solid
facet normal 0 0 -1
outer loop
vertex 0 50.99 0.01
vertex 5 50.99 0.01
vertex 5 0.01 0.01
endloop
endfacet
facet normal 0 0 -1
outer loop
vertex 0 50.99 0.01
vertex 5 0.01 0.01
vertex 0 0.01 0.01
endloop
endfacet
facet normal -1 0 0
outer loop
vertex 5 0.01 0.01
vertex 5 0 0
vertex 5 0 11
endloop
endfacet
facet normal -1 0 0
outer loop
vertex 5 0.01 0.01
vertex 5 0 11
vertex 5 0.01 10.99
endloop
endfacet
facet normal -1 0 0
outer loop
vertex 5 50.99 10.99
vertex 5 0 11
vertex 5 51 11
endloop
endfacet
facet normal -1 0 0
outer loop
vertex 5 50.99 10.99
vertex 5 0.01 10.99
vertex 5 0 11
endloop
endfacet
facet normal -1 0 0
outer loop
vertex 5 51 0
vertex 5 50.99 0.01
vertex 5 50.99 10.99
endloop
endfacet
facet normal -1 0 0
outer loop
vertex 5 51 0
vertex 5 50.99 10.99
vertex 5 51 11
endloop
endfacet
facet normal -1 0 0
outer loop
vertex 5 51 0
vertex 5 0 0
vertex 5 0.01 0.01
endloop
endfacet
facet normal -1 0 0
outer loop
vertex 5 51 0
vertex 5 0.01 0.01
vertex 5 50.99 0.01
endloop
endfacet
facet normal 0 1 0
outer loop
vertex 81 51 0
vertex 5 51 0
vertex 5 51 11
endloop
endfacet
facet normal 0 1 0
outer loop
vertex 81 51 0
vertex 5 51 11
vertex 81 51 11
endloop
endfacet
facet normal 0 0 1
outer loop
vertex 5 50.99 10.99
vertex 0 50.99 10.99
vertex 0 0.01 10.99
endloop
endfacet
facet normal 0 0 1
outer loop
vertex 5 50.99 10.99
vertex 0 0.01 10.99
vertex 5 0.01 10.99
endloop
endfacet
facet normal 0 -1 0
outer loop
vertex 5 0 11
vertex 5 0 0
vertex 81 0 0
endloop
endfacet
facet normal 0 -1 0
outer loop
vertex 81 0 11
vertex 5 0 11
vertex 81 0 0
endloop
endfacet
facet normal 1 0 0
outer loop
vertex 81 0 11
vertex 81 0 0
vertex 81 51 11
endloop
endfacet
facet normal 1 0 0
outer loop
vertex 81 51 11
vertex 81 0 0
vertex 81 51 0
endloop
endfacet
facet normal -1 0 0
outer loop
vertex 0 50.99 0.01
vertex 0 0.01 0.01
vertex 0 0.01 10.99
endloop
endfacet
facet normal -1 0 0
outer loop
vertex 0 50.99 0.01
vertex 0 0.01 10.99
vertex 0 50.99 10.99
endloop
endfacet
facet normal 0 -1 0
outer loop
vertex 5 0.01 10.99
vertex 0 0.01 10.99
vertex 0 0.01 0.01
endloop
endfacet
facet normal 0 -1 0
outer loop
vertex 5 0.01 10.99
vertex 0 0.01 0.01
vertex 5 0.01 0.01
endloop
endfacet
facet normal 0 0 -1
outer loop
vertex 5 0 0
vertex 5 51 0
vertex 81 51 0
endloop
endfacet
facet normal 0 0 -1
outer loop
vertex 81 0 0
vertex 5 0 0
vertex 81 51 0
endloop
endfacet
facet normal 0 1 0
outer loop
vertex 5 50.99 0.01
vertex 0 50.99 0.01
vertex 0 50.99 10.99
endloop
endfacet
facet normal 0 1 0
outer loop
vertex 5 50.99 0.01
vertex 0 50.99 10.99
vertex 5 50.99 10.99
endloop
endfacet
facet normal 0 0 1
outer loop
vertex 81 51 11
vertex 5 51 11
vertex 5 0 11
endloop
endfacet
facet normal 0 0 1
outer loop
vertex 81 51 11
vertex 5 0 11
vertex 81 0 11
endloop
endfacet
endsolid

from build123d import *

# Parameters (mm, degrees)
SKETCH1_W           = 81
SKETCH1_H           = 51
BOSS_EXTRUDE1_DEPTH = 11
SKETCH2_W           = 5
SKETCH2_H           = 51
CUT_EXTRUDE1_DEPTH  = 0.01
SKETCH3_W           = 5
SKETCH3_H           = 10.99
CUT_EXTRUDE2_DEPTH  = 0.01
SKETCH4_W           = 5
SKETCH4_H           = 51
CUT_EXTRUDE3_DEPTH  = 0.01
SKETCH5_W           = 5
SKETCH5_H           = 11
CUT_EXTRUDE4_DEPTH  = 0.01


with BuildPart() as part:
    # Sketch1 → Boss-Extrude1 (new body)
    with BuildSketch(Plane.XY):
        with Locations((40.5, 25.5)):
            Rectangle(SKETCH1_W, SKETCH1_H)
    extrude(amount=BOSS_EXTRUDE1_DEPTH)

    # Sketch2 → Cut-Extrude1 (cut)
    with BuildSketch(Plane.XY.offset(11)):
        with Locations((2.5, 25.5)):
            Rectangle(SKETCH2_W, SKETCH2_H)
    extrude(amount=-CUT_EXTRUDE1_DEPTH, mode=Mode.SUBTRACT)

    # Sketch3 → Cut-Extrude2 (cut)
    with BuildSketch(Plane.XZ):
        with Locations((2.5, 5.495)):
            Rectangle(SKETCH3_W, SKETCH3_H)
    extrude(amount=-CUT_EXTRUDE2_DEPTH, mode=Mode.SUBTRACT)

    # Sketch4 → Cut-Extrude3 (cut)
    with BuildSketch(Plane(origin=(0, 0, 0), x_dir=(-1, 0, 0), z_dir=(0, 0, -1))):
        with Locations((-2.5, 25.5)):
            Rectangle(SKETCH4_W, SKETCH4_H)
    extrude(amount=-CUT_EXTRUDE3_DEPTH, mode=Mode.SUBTRACT)

    # Sketch5 → Cut-Extrude4 (cut)
    with BuildSketch(Plane(origin=(0, 51, 0), x_dir=(1, 0, 0), z_dir=(0, 1, 0))):
        with Locations((2.5, -5.5)):
            Rectangle(SKETCH5_W, SKETCH5_H)
    extrude(amount=-CUT_EXTRUDE4_DEPTH, mode=Mode.SUBTRACT)


solid = part.part
